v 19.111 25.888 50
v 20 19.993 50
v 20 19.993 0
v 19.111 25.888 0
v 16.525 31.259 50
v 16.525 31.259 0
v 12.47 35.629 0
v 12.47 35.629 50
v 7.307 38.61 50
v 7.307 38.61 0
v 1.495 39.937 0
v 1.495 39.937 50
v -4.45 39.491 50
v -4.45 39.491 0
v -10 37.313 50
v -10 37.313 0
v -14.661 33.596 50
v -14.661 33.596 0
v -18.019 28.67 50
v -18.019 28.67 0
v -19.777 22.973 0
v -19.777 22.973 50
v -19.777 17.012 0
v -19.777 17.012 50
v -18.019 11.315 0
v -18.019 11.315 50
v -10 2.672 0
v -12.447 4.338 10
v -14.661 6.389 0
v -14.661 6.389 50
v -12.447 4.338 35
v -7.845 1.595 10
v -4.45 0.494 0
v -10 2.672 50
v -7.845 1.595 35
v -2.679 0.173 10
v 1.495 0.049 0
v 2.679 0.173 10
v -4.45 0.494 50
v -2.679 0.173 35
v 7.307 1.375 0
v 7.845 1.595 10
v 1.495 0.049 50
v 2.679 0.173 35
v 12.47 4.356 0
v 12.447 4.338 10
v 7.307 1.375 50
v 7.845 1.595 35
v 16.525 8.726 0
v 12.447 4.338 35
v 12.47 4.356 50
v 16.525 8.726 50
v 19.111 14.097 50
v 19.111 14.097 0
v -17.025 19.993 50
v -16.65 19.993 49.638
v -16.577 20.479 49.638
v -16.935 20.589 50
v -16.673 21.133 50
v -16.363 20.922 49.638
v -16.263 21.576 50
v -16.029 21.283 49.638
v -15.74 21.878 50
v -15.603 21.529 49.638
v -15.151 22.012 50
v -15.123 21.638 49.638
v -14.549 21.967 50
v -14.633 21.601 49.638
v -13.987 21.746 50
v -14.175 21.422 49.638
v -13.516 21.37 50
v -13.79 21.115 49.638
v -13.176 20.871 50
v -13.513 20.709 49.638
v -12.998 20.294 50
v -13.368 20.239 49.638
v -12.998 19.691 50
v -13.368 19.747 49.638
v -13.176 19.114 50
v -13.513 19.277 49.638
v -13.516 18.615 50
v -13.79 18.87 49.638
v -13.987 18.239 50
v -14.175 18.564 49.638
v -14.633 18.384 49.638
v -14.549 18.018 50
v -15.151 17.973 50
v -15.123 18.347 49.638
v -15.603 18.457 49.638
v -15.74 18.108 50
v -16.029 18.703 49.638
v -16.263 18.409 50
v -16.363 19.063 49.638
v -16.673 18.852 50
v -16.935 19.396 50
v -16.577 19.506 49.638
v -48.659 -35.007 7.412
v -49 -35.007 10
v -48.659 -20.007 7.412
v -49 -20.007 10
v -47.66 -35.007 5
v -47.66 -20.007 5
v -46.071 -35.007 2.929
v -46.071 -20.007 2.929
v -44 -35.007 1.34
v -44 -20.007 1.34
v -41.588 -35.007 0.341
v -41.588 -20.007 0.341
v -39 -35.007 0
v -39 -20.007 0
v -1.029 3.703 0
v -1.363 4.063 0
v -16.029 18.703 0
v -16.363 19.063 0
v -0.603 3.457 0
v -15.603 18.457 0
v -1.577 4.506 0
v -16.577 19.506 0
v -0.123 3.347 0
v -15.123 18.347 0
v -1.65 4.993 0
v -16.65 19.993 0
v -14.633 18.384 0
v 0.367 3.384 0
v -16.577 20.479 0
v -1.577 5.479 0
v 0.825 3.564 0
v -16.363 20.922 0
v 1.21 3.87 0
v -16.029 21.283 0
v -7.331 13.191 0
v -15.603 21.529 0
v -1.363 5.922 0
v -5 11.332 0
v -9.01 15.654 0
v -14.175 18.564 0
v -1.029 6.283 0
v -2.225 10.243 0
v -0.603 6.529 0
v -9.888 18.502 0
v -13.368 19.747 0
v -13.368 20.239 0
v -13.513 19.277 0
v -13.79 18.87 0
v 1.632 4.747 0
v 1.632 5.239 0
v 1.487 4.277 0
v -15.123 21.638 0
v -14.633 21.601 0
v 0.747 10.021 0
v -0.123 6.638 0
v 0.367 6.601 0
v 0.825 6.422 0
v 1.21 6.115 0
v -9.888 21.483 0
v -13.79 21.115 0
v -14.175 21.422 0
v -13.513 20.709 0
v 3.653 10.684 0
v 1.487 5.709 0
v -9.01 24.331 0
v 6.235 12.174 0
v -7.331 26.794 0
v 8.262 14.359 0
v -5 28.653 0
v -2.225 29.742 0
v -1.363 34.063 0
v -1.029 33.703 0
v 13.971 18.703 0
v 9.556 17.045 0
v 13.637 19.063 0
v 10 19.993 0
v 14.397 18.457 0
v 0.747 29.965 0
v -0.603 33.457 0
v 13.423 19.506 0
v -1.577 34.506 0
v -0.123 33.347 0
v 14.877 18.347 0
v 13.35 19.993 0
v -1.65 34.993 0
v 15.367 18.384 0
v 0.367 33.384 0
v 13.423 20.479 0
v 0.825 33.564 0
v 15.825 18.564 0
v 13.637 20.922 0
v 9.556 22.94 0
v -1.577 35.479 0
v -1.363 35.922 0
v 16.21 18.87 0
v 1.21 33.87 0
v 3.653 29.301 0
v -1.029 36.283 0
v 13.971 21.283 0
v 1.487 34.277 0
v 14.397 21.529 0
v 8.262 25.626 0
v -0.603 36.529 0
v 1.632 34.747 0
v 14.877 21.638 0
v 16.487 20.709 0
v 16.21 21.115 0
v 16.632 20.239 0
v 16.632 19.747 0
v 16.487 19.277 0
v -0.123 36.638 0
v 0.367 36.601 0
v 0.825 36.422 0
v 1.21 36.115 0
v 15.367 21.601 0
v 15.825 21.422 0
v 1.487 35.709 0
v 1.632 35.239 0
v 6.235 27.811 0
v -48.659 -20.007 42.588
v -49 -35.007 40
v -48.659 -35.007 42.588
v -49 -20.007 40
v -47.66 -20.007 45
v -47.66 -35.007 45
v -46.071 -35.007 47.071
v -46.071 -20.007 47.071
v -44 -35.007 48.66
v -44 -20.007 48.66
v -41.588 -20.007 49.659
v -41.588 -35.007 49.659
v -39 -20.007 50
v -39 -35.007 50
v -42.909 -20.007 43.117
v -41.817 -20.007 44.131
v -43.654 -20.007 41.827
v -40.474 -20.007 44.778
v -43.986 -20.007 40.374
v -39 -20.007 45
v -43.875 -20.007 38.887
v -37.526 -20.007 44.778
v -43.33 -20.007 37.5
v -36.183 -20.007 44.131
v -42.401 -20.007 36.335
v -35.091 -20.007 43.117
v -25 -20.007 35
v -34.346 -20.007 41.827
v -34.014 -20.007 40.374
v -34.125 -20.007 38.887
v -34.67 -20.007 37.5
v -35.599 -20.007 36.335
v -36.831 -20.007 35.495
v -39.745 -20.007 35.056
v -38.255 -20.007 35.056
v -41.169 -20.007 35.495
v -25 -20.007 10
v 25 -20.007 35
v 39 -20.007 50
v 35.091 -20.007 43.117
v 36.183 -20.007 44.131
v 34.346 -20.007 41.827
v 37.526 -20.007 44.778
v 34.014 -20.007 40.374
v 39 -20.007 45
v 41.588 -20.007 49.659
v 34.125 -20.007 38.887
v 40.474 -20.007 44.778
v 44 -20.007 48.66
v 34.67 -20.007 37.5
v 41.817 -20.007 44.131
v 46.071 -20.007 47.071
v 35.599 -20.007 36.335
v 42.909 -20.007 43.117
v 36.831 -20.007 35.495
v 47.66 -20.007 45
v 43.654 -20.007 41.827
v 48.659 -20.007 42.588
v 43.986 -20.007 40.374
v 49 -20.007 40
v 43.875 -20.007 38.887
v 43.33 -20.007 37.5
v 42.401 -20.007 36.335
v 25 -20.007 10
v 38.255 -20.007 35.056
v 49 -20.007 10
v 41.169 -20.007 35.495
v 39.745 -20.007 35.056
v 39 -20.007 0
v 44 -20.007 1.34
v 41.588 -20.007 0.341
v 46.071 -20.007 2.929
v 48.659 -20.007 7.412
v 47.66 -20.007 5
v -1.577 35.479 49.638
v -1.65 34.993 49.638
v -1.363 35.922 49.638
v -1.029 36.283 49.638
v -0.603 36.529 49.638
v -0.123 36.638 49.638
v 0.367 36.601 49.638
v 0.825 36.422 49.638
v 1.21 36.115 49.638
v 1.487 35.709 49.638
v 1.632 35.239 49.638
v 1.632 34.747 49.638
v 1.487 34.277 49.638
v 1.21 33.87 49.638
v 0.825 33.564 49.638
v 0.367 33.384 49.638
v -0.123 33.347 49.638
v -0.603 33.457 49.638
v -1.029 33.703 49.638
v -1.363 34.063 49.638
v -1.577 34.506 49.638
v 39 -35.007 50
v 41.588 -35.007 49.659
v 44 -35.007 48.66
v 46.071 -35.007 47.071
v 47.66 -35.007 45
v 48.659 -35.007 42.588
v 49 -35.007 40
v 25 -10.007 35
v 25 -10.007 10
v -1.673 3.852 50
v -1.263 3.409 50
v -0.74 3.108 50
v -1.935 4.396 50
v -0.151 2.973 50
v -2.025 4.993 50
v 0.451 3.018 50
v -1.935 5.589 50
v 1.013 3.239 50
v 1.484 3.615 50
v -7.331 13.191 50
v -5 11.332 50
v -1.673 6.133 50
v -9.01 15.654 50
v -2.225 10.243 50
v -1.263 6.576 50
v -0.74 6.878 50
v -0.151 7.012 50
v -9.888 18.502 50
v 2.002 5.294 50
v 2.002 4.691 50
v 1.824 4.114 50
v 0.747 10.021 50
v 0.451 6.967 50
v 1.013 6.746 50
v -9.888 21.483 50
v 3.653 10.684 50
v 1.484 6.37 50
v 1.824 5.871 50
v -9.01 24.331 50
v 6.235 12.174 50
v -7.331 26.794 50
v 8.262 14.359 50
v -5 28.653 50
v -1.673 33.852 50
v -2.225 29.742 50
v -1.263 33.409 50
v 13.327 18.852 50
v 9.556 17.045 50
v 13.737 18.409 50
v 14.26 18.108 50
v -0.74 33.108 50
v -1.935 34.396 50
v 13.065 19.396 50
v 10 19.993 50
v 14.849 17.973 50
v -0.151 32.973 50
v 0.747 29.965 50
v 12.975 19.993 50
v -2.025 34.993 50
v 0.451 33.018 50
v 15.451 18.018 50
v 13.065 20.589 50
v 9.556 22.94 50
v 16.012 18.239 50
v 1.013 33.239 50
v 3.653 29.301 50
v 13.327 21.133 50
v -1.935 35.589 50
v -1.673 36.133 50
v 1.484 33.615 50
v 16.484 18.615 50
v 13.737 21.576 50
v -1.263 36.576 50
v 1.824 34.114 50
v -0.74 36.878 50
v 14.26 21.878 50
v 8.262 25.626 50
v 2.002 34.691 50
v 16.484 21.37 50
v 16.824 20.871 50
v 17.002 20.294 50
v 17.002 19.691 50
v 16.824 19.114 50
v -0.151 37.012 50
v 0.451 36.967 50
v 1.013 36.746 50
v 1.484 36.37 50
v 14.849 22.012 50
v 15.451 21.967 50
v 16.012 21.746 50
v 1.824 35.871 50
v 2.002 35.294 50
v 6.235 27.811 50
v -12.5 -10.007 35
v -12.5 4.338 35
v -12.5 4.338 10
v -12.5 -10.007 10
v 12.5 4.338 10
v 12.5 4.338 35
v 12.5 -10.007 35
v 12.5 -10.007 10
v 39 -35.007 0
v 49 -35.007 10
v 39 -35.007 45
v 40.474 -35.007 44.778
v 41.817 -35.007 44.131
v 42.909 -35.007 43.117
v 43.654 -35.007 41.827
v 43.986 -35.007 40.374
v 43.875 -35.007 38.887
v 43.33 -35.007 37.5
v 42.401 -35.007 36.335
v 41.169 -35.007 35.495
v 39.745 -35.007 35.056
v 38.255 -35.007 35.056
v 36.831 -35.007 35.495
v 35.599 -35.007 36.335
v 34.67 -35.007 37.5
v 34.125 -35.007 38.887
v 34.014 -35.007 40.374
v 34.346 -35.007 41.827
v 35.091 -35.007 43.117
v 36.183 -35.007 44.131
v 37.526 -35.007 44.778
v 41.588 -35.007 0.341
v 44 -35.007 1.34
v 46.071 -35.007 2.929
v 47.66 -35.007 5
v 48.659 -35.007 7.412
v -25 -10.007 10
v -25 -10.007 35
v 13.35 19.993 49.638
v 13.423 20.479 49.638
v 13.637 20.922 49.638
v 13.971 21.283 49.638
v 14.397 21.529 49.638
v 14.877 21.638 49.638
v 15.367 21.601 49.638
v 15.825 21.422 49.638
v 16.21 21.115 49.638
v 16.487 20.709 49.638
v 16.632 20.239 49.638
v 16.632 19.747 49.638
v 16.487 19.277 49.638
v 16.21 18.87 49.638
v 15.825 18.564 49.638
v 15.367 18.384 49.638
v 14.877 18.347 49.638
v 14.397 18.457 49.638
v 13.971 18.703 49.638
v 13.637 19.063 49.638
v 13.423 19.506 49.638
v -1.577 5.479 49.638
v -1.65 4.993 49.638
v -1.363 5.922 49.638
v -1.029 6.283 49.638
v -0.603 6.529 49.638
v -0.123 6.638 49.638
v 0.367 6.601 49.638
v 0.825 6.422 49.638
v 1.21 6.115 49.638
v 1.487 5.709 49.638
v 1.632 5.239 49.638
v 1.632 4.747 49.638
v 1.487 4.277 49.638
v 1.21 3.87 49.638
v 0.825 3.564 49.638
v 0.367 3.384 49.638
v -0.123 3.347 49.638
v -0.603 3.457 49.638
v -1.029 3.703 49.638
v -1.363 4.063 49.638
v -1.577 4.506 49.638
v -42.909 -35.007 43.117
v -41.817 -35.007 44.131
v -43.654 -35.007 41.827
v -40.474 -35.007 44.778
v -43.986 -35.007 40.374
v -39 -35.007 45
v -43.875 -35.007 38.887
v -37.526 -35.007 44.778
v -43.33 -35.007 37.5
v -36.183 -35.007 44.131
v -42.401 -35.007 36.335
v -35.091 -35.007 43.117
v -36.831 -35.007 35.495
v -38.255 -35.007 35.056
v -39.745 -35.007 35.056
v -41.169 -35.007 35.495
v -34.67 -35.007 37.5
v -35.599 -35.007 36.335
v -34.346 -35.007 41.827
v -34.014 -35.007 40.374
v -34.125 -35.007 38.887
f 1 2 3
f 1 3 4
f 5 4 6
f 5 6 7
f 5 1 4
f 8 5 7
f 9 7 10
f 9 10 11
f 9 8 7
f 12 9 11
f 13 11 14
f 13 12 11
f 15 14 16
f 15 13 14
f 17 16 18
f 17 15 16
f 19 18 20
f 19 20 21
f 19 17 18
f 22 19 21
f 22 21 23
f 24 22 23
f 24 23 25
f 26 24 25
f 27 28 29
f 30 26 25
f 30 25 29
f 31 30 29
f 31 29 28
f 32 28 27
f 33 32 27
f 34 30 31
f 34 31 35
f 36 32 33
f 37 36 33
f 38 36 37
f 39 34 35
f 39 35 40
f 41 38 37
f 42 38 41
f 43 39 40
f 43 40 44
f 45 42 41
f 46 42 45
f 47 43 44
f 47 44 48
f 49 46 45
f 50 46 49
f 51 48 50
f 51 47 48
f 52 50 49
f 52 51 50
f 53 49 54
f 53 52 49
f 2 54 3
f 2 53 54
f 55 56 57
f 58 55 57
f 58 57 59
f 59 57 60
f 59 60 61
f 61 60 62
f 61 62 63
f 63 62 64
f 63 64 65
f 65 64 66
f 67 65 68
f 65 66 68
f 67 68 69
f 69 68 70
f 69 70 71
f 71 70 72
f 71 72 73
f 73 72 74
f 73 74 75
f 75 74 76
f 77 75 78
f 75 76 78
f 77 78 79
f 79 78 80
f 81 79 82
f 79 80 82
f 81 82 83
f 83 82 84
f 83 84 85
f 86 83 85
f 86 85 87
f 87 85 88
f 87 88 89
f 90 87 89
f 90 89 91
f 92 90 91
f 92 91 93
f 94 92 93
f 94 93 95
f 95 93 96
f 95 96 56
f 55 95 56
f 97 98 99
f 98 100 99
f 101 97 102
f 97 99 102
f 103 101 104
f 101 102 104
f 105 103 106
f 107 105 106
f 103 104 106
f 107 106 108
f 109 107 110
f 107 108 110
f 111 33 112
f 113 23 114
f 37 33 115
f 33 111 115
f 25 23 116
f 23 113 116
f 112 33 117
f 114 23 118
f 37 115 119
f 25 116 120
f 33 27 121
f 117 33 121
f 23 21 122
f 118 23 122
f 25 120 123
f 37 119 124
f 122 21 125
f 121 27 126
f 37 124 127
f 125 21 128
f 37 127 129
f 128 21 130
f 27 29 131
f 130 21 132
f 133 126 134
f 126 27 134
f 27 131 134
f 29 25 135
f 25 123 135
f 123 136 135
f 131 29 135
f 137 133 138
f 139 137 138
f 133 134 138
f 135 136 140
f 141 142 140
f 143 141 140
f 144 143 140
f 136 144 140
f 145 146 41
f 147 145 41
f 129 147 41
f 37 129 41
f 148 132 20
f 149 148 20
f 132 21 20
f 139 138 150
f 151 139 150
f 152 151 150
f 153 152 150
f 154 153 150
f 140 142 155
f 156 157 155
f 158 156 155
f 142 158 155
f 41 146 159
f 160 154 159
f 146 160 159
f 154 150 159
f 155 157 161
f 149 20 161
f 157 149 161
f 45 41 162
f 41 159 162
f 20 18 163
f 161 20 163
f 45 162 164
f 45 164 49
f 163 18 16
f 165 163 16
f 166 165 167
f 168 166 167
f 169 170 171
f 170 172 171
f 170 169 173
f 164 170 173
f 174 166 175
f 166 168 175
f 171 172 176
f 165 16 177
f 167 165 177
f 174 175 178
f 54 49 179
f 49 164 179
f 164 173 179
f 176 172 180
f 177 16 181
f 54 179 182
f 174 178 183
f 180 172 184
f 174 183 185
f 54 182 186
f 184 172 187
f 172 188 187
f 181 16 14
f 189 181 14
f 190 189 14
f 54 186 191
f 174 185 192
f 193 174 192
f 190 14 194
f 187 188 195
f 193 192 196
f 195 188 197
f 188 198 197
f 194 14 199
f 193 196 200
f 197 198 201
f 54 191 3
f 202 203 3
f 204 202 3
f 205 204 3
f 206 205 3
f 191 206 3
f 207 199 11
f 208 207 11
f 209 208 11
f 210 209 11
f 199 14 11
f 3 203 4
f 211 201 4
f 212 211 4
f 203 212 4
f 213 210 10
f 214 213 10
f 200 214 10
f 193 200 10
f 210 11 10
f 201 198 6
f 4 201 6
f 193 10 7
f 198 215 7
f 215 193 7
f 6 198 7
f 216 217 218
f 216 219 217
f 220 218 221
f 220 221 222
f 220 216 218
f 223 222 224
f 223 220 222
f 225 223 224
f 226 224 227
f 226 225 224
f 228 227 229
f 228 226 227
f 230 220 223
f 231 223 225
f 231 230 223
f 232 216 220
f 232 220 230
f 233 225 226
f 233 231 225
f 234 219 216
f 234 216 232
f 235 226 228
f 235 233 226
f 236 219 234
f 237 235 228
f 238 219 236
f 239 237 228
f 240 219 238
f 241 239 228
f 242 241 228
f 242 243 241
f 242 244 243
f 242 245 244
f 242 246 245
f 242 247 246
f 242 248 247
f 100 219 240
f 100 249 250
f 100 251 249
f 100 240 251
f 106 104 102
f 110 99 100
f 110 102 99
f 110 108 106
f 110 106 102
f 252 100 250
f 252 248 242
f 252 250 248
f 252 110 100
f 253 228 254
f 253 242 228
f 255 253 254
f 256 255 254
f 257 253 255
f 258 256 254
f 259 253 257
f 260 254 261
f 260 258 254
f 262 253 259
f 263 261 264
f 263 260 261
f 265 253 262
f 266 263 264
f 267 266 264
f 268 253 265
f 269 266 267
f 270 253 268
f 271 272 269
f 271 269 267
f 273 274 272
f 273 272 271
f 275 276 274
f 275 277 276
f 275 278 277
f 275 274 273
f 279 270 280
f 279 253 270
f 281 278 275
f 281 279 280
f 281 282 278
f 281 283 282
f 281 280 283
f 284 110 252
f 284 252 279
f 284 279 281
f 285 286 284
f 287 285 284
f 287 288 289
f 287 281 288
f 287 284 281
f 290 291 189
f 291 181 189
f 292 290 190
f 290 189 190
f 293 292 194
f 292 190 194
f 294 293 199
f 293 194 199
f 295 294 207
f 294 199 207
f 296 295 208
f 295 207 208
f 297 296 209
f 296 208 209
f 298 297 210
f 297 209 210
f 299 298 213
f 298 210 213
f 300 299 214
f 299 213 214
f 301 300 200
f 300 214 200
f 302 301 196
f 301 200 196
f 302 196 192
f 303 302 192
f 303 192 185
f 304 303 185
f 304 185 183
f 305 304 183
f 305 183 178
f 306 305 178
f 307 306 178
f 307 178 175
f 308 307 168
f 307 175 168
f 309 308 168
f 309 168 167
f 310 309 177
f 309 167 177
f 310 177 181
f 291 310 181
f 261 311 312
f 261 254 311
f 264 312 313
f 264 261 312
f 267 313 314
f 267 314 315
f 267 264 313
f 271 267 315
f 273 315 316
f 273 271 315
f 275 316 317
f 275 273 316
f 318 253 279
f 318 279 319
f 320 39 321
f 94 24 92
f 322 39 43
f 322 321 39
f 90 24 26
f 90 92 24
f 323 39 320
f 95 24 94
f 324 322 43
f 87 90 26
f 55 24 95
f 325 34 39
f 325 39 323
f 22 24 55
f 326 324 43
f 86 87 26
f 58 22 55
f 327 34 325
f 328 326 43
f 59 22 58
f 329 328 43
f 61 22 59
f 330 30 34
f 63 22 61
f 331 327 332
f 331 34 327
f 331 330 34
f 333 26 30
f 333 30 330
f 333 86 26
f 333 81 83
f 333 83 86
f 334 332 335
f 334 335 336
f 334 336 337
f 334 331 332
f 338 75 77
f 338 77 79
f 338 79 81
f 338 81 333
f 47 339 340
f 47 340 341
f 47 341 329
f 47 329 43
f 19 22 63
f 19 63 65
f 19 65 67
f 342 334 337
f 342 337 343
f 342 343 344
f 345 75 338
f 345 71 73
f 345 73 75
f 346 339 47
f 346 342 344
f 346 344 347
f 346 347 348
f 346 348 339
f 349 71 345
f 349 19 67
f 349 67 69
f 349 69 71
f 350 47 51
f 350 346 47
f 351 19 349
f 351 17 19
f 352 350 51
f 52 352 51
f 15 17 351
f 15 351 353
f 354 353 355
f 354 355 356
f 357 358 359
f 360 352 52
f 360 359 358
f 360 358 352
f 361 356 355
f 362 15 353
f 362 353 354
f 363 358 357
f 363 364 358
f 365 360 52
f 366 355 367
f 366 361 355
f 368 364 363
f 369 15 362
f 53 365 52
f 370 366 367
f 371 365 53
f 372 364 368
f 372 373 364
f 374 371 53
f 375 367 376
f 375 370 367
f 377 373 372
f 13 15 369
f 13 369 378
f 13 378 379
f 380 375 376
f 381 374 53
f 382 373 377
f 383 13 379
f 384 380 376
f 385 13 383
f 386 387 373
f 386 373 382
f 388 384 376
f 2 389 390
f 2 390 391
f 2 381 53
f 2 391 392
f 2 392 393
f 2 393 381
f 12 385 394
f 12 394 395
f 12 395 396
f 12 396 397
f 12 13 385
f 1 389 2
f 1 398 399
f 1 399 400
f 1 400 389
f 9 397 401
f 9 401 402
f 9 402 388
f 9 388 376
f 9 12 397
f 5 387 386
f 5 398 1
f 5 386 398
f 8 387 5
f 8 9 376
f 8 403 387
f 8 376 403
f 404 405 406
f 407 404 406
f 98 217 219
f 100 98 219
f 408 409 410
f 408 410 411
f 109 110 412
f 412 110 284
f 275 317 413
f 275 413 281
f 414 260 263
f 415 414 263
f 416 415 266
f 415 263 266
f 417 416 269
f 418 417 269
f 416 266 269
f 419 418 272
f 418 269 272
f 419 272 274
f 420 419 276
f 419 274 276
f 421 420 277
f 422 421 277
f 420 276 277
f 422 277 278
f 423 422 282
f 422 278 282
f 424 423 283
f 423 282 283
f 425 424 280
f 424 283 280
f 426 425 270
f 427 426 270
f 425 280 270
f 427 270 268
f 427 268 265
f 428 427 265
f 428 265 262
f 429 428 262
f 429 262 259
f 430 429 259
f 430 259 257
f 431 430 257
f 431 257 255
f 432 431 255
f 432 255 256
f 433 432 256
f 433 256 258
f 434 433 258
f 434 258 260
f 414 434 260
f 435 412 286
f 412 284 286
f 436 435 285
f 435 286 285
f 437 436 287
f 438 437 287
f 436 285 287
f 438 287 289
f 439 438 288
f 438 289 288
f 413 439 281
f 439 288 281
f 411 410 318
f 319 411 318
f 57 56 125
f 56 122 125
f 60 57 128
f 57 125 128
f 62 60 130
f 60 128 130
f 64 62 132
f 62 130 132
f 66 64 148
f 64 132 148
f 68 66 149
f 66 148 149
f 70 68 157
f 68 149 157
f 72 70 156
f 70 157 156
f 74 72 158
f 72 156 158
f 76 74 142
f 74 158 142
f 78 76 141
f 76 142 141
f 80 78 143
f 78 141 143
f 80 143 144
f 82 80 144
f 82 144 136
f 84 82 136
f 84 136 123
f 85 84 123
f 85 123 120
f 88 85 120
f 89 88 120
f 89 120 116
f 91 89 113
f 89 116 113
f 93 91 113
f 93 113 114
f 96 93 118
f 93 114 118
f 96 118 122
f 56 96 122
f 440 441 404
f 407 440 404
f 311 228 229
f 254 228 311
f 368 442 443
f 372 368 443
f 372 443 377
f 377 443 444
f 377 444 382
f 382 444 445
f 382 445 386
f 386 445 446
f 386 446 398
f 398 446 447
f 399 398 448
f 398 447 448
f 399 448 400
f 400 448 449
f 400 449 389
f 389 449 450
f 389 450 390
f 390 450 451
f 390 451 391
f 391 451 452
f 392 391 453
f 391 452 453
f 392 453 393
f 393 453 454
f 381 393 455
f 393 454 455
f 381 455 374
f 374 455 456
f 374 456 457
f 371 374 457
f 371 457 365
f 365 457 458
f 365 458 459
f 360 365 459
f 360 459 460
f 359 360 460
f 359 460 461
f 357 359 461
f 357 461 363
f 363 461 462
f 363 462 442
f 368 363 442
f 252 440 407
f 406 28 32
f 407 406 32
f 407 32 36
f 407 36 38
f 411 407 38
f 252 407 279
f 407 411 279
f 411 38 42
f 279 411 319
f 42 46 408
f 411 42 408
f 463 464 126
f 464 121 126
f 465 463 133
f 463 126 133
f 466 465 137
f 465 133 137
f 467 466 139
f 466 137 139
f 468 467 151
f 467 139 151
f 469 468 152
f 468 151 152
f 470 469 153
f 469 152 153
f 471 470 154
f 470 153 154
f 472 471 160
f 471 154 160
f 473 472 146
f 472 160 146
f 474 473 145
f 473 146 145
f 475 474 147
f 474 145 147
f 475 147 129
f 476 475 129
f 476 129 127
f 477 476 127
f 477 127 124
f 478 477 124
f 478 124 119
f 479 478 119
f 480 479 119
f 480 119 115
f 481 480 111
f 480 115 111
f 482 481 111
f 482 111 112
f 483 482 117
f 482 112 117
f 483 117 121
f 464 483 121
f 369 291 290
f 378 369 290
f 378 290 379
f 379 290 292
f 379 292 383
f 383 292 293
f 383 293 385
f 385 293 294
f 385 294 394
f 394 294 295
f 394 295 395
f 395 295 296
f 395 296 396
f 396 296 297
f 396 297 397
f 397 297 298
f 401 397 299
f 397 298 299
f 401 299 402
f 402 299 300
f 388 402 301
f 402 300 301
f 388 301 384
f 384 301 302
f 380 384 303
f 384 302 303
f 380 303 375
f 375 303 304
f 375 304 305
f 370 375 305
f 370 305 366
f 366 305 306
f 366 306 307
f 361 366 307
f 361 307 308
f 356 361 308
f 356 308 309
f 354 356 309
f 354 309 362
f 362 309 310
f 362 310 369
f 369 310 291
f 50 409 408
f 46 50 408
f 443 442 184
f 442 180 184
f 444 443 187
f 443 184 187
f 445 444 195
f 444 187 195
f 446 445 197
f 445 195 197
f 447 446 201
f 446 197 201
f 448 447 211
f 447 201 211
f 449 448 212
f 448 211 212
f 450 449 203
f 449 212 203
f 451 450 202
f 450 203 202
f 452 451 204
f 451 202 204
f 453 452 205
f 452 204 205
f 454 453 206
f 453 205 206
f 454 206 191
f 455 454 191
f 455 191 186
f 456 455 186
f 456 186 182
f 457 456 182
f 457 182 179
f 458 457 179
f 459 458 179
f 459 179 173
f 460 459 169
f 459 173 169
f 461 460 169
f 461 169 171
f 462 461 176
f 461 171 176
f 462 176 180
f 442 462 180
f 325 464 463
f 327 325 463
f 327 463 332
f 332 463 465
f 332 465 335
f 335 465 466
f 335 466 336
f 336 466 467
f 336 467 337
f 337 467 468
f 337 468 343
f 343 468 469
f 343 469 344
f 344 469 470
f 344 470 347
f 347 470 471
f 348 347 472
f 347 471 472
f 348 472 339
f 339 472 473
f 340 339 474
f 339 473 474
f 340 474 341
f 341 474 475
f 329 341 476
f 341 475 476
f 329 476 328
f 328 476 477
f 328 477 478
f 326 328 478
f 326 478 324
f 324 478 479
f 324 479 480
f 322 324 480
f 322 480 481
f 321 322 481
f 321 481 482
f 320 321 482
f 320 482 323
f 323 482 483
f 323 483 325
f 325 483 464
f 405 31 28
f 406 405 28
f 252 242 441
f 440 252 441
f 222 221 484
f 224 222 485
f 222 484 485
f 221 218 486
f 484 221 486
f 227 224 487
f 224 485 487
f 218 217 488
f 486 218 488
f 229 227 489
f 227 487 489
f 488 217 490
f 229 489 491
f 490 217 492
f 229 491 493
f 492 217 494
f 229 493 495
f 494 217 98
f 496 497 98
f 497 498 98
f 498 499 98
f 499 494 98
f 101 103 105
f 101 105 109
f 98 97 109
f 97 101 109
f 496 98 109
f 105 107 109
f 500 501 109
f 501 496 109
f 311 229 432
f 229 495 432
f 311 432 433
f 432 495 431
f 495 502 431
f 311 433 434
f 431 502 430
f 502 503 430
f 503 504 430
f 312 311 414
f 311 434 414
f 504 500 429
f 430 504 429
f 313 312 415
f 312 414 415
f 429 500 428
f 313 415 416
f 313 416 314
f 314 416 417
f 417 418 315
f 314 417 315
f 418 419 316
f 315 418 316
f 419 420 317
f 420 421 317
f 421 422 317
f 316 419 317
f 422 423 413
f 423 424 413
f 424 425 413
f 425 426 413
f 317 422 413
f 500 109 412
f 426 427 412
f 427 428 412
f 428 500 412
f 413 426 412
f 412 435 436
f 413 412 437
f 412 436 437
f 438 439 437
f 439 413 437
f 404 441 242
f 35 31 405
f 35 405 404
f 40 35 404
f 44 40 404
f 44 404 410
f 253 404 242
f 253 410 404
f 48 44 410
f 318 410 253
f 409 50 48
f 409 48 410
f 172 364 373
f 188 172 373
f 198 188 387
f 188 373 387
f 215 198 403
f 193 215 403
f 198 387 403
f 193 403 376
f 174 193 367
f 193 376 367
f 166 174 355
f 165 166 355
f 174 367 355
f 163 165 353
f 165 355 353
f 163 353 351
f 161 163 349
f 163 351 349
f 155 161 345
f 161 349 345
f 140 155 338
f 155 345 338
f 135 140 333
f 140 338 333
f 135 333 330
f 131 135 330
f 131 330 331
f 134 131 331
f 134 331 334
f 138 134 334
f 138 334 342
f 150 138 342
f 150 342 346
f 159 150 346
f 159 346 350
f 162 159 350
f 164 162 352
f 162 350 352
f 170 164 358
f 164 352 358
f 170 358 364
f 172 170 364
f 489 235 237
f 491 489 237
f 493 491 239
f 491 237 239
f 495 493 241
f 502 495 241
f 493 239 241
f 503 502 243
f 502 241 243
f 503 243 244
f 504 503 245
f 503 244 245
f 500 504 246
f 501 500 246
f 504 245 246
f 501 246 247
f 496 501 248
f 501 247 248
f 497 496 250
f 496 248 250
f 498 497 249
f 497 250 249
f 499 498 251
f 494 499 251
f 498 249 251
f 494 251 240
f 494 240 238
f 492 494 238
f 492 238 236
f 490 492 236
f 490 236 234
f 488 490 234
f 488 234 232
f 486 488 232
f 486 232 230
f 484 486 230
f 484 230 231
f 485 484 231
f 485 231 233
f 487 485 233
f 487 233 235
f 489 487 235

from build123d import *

# Parameters (mm, degrees)
SKETCH_1_W                   = 98
SKETCH_1_H                   = 15
EXTRUDE_1_DEPTH              = 50
SKETCH_2_R                   = 20
SKETCH_2_R_2                 = 10
EXTRUDE_2_DEPTH              = 50
SKETCH_4_W                   = 25
SKETCH_4_H                   = 24.3455958
EXTRUDE_3_DEPTH              = 12.5
FILLET_1_R                   = 10
SKETCH_7_R                   = 5
CUT_EXTRUDE_1_DEPTH          = 25
HOLE_WIZARD_M4_1_D           = 3.3
HOLE_WIZARD_M4_1_CSINK_D     = 4.05
HOLE_WIZARD_M4_1_CSINK_ANGLE = 92
SKETCH_12_W                  = 50
SKETCH_12_H                  = 10
EXTRUDE_4_DEPTH              = 25


with BuildPart() as part:
    # 스케치1 → 보스-돌출1 (new body)
    with BuildSketch(Plane.XY):
        with Locations((0, -27.507396928)):
            Rectangle(SKETCH_1_W, SKETCH_1_H)
    extrude(amount=EXTRUDE_1_DEPTH)



with BuildPart() as body_2:
    # 스케치2 → 보스-돌출2 (new body)
    with BuildSketch(Plane.XY.offset(50)):
        with Locations((0, 19.992603072)):
            Circle(SKETCH_2_R)
        with Locations((0, 19.992603072)):
            Circle(SKETCH_2_R_2, mode=Mode.SUBTRACT)
    extrude(amount=-EXTRUDE_2_DEPTH)


with BuildPart() as part_1:
    add(part.part)

    add(body_2.part)  # 보스-돌출3 merges body 2
    # 스케치4 → 보스-돌출3 (add, symmetric)
    with BuildSketch(Plane(origin=(0, 0, 0), x_dir=(0, 0, -1), z_dir=(1, 0, 0))):
        with Locations((-22.5, -7.834599028)):
            Rectangle(SKETCH_4_W, SKETCH_4_H)
    extrude(amount=EXTRUDE_3_DEPTH, both=True)

    # 필렛1
    fillet_1_edges = [part_1.edges().sort_by_distance(p)[0] for p in [
        (-49, -27.507396928, 50),
        (49, -27.507396928, 50),
        (-49, -27.507396928, 0),
        (49, -27.507396928, 0),
    ]]
    fillet(fillet_1_edges, radius=FILLET_1_R)

    # 스케치7 → 컷-돌출1 (cut)
    with BuildSketch(Plane(origin=(0, -20.007396928, 0), x_dir=(1, 0, 0), z_dir=(0, 1, 0))):
        with Locations(Location((-39, -40, 0), (0, 0, 270))):
            Circle(SKETCH_7_R)
        with Locations(Location((39, -40, 0), (0, 0, 270))):
            Circle(SKETCH_7_R)
    extrude(amount=-CUT_EXTRUDE_1_DEPTH, mode=Mode.SUBTRACT)

    # M4 나사 구멍1 (through all)
    with Locations(Plane(origin=(0, 34.992603072, 50), x_dir=(1, 0, 0), z_dir=(0, 0, 1))):
        with Locations((0, 0), (-15, -15), (15, -15), (0, -30)):
            CounterSinkHole(HOLE_WIZARD_M4_1_D / 2, HOLE_WIZARD_M4_1_CSINK_D / 2, counter_sink_angle=HOLE_WIZARD_M4_1_CSINK_ANGLE)

    # 스케치12 → 보스-돌출4 (add)
    with BuildSketch(Plane.XY.offset(35)):
        with Locations((0, -15.007396928)):
            Rectangle(SKETCH_12_W, SKETCH_12_H)
    extrude(amount=-EXTRUDE_4_DEPTH)


solid = part_1.part
